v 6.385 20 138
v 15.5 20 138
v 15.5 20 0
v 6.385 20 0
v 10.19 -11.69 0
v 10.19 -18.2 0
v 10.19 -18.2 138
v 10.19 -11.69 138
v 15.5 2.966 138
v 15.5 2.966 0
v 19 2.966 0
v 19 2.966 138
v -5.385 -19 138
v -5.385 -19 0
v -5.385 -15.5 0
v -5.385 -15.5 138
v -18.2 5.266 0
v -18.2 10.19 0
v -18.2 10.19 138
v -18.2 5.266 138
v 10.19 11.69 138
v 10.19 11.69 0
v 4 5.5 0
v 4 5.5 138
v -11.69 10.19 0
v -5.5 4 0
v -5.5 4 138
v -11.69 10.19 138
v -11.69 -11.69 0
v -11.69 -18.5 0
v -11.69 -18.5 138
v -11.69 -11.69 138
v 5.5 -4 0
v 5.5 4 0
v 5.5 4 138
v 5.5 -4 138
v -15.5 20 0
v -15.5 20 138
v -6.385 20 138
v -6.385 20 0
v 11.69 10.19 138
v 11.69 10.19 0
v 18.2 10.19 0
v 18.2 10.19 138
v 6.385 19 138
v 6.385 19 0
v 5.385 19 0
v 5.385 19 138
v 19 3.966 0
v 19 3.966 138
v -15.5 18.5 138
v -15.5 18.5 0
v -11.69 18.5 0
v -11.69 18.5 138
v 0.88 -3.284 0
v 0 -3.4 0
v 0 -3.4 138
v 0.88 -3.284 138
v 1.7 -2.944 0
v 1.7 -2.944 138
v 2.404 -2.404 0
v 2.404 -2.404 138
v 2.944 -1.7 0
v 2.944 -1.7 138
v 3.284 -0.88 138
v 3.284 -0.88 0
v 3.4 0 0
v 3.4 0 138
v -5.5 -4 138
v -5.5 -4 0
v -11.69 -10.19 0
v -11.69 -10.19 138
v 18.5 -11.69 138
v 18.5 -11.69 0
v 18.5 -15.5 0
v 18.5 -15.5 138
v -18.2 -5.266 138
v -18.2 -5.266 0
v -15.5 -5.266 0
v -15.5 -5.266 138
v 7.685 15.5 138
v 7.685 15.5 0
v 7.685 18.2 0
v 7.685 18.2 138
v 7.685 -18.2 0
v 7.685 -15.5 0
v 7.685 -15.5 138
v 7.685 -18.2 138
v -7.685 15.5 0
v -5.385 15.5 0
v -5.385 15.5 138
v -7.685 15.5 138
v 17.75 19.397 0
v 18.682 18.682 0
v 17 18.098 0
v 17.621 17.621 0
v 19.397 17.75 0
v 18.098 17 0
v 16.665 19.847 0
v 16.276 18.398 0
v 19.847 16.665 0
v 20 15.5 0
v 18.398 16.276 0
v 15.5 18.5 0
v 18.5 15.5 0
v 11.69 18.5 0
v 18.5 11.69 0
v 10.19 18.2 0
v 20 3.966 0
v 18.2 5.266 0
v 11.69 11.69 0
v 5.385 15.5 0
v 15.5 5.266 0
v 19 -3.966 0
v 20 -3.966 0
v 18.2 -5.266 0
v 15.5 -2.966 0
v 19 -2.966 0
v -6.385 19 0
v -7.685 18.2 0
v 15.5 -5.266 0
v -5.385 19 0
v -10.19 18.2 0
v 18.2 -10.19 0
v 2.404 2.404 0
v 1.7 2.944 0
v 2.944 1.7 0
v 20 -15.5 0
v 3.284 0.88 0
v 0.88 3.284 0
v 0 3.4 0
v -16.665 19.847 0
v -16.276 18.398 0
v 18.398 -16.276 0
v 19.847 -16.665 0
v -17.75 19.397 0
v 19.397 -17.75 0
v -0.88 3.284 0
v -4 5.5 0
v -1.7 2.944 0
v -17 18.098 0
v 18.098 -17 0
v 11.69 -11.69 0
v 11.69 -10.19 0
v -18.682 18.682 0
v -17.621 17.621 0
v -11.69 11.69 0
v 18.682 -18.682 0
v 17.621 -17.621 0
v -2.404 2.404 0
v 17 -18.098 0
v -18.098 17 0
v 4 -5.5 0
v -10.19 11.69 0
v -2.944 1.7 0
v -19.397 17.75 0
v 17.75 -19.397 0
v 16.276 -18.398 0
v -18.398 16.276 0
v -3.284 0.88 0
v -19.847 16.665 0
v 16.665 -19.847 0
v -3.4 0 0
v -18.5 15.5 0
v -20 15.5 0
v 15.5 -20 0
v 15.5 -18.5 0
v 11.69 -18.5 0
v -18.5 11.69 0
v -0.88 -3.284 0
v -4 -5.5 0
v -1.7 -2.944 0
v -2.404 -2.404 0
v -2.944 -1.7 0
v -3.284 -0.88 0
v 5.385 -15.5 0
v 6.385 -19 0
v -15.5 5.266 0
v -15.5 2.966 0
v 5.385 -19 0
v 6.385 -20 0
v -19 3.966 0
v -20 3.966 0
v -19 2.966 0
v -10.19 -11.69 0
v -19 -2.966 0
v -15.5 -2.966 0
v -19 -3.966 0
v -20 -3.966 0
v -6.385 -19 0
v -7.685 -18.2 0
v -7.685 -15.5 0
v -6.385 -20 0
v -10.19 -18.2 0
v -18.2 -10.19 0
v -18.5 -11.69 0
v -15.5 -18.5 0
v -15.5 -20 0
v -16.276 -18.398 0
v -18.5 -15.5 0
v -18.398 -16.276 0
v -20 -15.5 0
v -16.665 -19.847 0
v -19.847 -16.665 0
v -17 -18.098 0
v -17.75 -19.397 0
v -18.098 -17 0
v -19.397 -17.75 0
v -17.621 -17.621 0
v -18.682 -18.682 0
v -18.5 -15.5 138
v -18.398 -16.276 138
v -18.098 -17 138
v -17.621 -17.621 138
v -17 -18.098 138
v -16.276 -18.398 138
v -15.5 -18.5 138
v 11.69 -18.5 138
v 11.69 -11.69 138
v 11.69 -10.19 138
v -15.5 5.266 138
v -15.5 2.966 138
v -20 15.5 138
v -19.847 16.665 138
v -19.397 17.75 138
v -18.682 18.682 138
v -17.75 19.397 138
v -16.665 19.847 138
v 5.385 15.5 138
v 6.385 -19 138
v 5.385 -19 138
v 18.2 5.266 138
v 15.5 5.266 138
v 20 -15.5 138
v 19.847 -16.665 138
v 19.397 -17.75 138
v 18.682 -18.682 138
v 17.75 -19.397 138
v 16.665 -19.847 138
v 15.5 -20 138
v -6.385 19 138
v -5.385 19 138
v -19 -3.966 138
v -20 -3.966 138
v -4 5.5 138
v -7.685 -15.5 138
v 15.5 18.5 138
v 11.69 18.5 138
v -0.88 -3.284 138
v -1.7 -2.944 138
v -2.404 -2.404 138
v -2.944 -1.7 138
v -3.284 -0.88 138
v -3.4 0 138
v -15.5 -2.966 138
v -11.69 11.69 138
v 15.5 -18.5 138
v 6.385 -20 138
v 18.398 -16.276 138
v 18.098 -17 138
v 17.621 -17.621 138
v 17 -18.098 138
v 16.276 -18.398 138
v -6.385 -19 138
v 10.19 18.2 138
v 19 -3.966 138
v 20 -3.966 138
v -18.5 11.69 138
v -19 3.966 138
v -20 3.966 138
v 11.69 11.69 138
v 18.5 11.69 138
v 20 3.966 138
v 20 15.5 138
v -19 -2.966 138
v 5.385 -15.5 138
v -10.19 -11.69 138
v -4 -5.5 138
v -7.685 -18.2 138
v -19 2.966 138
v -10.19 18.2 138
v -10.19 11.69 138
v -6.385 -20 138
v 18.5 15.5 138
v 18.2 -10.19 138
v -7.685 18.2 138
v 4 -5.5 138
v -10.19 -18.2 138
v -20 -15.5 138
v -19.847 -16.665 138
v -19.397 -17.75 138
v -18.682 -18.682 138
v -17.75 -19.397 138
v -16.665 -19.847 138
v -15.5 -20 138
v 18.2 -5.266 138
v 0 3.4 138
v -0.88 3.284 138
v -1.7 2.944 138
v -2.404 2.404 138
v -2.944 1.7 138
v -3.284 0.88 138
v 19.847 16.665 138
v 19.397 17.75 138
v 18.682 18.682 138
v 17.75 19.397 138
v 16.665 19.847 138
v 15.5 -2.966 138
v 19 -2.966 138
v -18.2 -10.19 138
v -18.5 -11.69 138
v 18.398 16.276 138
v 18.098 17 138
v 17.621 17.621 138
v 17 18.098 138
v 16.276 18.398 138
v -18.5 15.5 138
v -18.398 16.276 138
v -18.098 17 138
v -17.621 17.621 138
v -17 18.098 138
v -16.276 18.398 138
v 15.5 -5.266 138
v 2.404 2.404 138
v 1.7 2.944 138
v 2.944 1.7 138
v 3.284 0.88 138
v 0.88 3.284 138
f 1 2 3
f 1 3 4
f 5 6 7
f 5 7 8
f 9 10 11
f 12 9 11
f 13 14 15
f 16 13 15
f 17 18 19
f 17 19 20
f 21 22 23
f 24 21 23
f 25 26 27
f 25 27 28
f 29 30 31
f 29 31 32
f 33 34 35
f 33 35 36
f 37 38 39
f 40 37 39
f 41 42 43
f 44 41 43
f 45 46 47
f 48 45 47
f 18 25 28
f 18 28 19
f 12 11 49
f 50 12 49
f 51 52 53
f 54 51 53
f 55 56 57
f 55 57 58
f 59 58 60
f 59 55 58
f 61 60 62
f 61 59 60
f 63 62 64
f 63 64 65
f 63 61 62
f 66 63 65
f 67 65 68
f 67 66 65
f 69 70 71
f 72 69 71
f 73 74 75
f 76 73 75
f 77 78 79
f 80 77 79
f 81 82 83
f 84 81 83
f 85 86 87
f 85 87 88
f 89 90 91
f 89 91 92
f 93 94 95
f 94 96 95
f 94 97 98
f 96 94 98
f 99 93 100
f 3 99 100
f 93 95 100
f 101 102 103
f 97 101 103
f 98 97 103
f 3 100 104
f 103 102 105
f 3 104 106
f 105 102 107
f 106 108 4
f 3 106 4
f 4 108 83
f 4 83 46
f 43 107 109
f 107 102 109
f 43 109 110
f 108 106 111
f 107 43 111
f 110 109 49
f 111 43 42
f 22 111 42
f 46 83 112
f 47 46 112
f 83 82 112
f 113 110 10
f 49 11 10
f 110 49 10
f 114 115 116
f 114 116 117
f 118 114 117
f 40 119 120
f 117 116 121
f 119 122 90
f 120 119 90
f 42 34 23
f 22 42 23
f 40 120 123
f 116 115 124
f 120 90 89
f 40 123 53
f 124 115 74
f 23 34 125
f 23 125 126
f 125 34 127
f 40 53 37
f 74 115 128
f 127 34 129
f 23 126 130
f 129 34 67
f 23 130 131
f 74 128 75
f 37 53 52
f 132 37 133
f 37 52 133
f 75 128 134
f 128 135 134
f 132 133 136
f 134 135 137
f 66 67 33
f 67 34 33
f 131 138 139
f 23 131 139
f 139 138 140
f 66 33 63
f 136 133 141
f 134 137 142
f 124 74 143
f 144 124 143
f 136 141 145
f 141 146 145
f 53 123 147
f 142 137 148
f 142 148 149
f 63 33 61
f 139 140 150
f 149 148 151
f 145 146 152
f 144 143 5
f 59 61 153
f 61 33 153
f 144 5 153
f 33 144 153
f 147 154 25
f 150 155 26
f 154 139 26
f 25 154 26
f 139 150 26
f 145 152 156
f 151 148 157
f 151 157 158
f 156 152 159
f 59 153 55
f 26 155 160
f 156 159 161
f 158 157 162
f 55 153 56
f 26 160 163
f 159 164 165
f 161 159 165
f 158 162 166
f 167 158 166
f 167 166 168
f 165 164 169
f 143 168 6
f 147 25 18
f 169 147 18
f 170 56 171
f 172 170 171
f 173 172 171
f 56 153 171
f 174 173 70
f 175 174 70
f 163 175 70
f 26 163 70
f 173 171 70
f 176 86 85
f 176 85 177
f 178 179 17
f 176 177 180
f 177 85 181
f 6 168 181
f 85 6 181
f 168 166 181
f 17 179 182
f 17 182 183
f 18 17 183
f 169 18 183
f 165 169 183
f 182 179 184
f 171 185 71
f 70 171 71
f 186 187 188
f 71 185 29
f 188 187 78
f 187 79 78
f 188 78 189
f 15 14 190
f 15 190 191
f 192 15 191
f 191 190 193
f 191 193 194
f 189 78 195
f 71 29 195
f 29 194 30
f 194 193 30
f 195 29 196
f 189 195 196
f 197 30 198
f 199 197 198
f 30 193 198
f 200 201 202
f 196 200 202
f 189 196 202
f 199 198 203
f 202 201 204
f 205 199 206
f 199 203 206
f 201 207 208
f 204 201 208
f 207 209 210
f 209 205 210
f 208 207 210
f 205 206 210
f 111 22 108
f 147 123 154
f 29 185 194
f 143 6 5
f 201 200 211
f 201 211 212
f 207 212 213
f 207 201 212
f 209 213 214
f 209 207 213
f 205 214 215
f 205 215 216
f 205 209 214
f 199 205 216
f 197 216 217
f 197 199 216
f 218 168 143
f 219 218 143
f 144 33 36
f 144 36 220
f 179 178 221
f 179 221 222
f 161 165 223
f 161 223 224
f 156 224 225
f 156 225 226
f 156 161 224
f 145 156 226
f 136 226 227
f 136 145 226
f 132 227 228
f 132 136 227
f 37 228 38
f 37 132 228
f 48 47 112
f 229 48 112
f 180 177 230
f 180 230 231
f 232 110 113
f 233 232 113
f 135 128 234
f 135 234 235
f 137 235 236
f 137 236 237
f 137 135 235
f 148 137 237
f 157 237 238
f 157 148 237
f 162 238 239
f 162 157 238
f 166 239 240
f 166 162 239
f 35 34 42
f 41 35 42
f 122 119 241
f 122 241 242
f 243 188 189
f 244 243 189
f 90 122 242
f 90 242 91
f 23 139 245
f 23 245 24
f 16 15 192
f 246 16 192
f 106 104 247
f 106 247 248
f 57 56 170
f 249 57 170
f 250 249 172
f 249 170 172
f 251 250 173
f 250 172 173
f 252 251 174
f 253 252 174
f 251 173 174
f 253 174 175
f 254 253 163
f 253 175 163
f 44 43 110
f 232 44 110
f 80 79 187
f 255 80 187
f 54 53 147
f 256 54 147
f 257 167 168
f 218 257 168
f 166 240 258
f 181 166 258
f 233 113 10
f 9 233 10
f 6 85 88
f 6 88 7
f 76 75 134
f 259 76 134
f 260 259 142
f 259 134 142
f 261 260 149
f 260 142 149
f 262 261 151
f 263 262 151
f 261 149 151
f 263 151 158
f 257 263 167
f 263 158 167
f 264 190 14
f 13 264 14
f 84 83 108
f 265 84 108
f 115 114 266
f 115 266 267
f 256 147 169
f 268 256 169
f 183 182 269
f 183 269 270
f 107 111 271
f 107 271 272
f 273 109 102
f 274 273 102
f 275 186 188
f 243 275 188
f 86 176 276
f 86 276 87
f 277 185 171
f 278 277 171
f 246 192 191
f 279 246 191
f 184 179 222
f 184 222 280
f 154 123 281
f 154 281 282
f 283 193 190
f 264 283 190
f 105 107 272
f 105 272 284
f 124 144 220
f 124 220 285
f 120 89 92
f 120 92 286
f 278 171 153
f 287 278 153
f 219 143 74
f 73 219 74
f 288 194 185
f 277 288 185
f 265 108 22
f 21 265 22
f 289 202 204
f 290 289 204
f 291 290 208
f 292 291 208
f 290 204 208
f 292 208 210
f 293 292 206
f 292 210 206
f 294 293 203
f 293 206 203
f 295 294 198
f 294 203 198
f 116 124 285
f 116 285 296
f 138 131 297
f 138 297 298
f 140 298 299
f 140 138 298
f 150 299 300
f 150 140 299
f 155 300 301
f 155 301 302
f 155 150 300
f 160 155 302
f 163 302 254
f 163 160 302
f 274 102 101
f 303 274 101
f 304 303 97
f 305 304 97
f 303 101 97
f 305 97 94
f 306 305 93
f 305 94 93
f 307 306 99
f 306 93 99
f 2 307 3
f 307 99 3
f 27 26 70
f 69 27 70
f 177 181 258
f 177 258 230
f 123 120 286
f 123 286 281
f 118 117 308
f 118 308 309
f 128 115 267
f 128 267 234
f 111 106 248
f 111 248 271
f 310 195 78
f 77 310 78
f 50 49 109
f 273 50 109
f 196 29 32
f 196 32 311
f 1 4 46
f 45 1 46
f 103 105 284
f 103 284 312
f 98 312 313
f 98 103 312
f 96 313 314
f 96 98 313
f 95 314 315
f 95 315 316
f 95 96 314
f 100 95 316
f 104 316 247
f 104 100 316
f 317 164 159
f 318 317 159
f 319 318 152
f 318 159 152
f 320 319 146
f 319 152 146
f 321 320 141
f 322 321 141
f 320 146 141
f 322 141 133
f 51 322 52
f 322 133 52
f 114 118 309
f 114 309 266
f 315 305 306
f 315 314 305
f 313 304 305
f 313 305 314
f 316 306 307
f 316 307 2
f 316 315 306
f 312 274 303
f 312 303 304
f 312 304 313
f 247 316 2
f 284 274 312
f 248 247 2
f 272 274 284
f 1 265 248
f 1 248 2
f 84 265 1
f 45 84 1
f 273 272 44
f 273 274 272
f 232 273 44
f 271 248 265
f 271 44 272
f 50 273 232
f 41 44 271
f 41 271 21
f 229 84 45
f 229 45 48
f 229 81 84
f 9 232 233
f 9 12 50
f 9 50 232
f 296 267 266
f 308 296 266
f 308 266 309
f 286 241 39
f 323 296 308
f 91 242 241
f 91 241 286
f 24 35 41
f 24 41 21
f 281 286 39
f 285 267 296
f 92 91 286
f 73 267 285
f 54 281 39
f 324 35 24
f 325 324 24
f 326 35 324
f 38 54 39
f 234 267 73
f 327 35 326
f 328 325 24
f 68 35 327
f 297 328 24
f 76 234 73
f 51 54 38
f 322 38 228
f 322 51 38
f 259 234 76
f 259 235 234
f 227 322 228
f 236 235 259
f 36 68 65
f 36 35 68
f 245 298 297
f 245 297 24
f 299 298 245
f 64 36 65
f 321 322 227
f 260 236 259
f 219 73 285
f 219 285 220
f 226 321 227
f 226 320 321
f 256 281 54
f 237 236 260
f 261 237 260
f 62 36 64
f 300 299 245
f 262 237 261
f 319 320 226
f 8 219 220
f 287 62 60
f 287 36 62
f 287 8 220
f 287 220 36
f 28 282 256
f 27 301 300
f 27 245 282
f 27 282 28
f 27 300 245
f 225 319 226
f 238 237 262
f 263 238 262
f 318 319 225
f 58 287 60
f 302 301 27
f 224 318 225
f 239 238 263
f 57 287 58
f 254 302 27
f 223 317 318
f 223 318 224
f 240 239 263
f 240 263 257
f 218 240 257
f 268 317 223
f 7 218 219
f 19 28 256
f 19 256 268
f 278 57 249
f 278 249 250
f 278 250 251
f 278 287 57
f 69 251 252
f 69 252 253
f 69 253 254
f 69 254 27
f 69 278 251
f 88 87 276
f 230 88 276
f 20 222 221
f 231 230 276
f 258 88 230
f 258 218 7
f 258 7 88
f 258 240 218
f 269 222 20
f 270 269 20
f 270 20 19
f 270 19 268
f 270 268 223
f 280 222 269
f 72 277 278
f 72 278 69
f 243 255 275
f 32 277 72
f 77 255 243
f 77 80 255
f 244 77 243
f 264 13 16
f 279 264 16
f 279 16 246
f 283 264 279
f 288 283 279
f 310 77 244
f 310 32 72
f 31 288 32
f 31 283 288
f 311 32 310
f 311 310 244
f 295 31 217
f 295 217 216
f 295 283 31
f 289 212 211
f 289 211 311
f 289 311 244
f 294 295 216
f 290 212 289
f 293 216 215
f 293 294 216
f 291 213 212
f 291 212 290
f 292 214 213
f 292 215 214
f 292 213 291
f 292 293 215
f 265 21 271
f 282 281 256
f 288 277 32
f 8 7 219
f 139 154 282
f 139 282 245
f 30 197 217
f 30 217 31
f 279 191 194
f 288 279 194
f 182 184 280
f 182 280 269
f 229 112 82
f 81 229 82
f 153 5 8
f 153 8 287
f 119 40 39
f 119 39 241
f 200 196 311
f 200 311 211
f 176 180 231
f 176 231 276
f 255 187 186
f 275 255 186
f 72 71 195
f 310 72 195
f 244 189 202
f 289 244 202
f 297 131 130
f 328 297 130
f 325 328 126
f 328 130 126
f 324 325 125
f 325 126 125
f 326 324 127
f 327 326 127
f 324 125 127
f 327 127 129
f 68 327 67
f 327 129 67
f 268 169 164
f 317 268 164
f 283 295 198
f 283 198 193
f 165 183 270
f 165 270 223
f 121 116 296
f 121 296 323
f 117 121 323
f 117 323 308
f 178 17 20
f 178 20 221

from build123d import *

# Parameters (mm, degrees)
BOSS_EXTRUDE1_DEPTH  = 138
MIRROR3_COPY_1_DEPTH = 138
MIRROR3_COPY_2_DEPTH = 138


with BuildPart() as part:
    # Sketch1 → Boss-Extrude1 (new body)
    with BuildSketch(Plane.XY):
        with BuildLine():
            Line((3.4, 0), (5.5, 0))
            Line((5.5, 0), (5.5, 4))
            Line((5.5, 4), (11.69, 10.19))
            Line((11.69, 10.19), (18.2, 10.19))
            Line((18.2, 10.19), (18.2, 5.265595036))
            Line((18.2, 5.265595036), (15.5, 5.265595036))
            Line((15.5, 5.265595036), (15.5, 2.965595036))
            Line((15.5, 2.965595036), (19, 2.965595036))
            Line((19, 2.965595036), (19, 3.965595036))
            Line((19, 3.965595036), (20, 3.965595036))
            Line((20, 3.965595036), (20, 15.5))
            ThreePointArc((20, 15.5), (18.681980515, 18.681980515), (15.5, 20))
            Line((15.5, 20), (6.385304712, 20))
            Line((6.385304712, 20), (6.385304712, 19))
            Line((6.385304712, 19), (5.385304712, 19))
            Line((5.385304712, 19), (5.385304712, 15.5))
            Line((5.385304712, 15.5), (7.685304712, 15.5))
            Line((7.685304712, 15.5), (7.685304712, 18.2))
            Line((7.685304712, 18.2), (10.19, 18.2))
            Line((10.19, 18.2), (10.19, 11.69))
            Line((10.19, 11.69), (4, 5.5))
            Line((4, 5.5), (0, 5.5))
            Line((0, 5.5), (0, 3.4))
            ThreePointArc((0, 3.4), (2.404163056, 2.404163056), (3.4, 0))
        make_face()
        with BuildLine():
            Line((18.5, 11.69), (18.5, 15.5))
            ThreePointArc((18.5, 15.5), (17.621320344, 17.621320344), (15.5, 18.5))
            Line((15.5, 18.5), (11.69, 18.5))
            Line((11.69, 18.5), (11.69, 11.69))
            Line((11.69, 11.69), (18.5, 11.69))
        make_face(mode=Mode.SUBTRACT)
    boss_extrude1 = extrude(amount=BOSS_EXTRUDE1_DEPTH)

    # Mirror1: Boss-Extrude1 across plane
    add(boss_extrude1.mirror(Plane.ZX))

    # Mirror2: Boss-Extrude1 across plane
    add(boss_extrude1.mirror(Plane(origin=(0, 0, 0), x_dir=(0, 0, 1), z_dir=(1, 0, 0))))

    # Mirror3 copy 1 sketch → Mirror3 copy 1 (add)
    with BuildSketch(Plane(origin=(0, 0, 0), x_dir=(-1, 0, 0), z_dir=(0, 0, 1))):
        with BuildLine():
            Line((3.4, 0), (5.5, 0))
            Line((5.5, 0), (5.5, 4))
            Line((5.5, 4), (11.69, 10.19))
            Line((11.69, 10.19), (18.2, 10.19))
            Line((18.2, 10.19), (18.2, 5.265595036))
            Line((18.2, 5.265595036), (15.5, 5.265595036))
            Line((15.5, 5.265595036), (15.5, 2.965595036))
            Line((15.5, 2.965595036), (19, 2.965595036))
            Line((19, 2.965595036), (19, 3.965595036))
            Line((19, 3.965595036), (20, 3.965595036))
            Line((20, 3.965595036), (20, 15.5))
            ThreePointArc((20, 15.5), (18.681980515, 18.681980515), (15.5, 20))
            Line((15.5, 20), (6.385304712, 20))
            Line((6.385304712, 20), (6.385304712, 19))
            Line((6.385304712, 19), (5.385304712, 19))
            Line((5.385304712, 19), (5.385304712, 15.5))
            Line((5.385304712, 15.5), (7.685304712, 15.5))
            Line((7.685304712, 15.5), (7.685304712, 18.2))
            Line((7.685304712, 18.2), (10.19, 18.2))
            Line((10.19, 18.2), (10.19, 11.69))
            Line((10.19, 11.69), (4, 5.5))
            Line((4, 5.5), (0, 5.5))
            Line((0, 5.5), (0, 3.4))
            ThreePointArc((0, 3.4), (2.404163056, 2.404163056), (3.4, 0))
        make_face()
        with BuildLine():
            Line((18.5, 11.69), (18.5, 15.5))
            ThreePointArc((18.5, 15.5), (17.621320344, 17.621320344), (15.5, 18.5))
            Line((15.5, 18.5), (11.69, 18.5))
            Line((11.69, 18.5), (11.69, 11.69))
            Line((11.69, 11.69), (18.5, 11.69))
        make_face(mode=Mode.SUBTRACT)
    extrude(amount=MIRROR3_COPY_1_DEPTH)

    # Mirror3 copy 2 sketch → Mirror3 copy 2 (add)
    with BuildSketch(Plane.XY):
        with BuildLine():
            Line((3.4, 0), (5.5, 0))
            Line((5.5, 0), (5.5, -4))
            Line((5.5, -4), (11.69, -10.19))
            Line((11.69, -10.19), (18.2, -10.19))
            Line((18.2, -10.19), (18.2, -5.265595036))
            Line((18.2, -5.265595036), (15.5, -5.265595036))
            Line((15.5, -5.265595036), (15.5, -2.965595036))
            Line((15.5, -2.965595036), (19, -2.965595036))
            Line((19, -2.965595036), (19, -3.965595036))
            Line((19, -3.965595036), (20, -3.965595036))
            Line((20, -3.965595036), (20, -15.5))
            ThreePointArc((20, -15.5), (18.681980515, -18.681980515), (15.5, -20))
            Line((15.5, -20), (6.385304712, -20))
            Line((6.385304712, -20), (6.385304712, -19))
            Line((6.385304712, -19), (5.385304712, -19))
            Line((5.385304712, -19), (5.385304712, -15.5))
            Line((5.385304712, -15.5), (7.685304712, -15.5))
            Line((7.685304712, -15.5), (7.685304712, -18.2))
            Line((7.685304712, -18.2), (10.19, -18.2))
            Line((10.19, -18.2), (10.19, -11.69))
            Line((10.19, -11.69), (4, -5.5))
            Line((4, -5.5), (0, -5.5))
            Line((0, -5.5), (0, -3.4))
            ThreePointArc((0, -3.4), (2.404163056, -2.404163056), (3.4, 0))
        make_face()
        with BuildLine():
            Line((18.5, -11.69), (18.5, -15.5))
            ThreePointArc((18.5, -15.5), (17.621320344, -17.621320344), (15.5, -18.5))
            Line((15.5, -18.5), (11.69, -18.5))
            Line((11.69, -18.5), (11.69, -11.69))
            Line((11.69, -11.69), (18.5, -11.69))
        make_face(mode=Mode.SUBTRACT)
    extrude(amount=MIRROR3_COPY_2_DEPTH)


solid = part.part
